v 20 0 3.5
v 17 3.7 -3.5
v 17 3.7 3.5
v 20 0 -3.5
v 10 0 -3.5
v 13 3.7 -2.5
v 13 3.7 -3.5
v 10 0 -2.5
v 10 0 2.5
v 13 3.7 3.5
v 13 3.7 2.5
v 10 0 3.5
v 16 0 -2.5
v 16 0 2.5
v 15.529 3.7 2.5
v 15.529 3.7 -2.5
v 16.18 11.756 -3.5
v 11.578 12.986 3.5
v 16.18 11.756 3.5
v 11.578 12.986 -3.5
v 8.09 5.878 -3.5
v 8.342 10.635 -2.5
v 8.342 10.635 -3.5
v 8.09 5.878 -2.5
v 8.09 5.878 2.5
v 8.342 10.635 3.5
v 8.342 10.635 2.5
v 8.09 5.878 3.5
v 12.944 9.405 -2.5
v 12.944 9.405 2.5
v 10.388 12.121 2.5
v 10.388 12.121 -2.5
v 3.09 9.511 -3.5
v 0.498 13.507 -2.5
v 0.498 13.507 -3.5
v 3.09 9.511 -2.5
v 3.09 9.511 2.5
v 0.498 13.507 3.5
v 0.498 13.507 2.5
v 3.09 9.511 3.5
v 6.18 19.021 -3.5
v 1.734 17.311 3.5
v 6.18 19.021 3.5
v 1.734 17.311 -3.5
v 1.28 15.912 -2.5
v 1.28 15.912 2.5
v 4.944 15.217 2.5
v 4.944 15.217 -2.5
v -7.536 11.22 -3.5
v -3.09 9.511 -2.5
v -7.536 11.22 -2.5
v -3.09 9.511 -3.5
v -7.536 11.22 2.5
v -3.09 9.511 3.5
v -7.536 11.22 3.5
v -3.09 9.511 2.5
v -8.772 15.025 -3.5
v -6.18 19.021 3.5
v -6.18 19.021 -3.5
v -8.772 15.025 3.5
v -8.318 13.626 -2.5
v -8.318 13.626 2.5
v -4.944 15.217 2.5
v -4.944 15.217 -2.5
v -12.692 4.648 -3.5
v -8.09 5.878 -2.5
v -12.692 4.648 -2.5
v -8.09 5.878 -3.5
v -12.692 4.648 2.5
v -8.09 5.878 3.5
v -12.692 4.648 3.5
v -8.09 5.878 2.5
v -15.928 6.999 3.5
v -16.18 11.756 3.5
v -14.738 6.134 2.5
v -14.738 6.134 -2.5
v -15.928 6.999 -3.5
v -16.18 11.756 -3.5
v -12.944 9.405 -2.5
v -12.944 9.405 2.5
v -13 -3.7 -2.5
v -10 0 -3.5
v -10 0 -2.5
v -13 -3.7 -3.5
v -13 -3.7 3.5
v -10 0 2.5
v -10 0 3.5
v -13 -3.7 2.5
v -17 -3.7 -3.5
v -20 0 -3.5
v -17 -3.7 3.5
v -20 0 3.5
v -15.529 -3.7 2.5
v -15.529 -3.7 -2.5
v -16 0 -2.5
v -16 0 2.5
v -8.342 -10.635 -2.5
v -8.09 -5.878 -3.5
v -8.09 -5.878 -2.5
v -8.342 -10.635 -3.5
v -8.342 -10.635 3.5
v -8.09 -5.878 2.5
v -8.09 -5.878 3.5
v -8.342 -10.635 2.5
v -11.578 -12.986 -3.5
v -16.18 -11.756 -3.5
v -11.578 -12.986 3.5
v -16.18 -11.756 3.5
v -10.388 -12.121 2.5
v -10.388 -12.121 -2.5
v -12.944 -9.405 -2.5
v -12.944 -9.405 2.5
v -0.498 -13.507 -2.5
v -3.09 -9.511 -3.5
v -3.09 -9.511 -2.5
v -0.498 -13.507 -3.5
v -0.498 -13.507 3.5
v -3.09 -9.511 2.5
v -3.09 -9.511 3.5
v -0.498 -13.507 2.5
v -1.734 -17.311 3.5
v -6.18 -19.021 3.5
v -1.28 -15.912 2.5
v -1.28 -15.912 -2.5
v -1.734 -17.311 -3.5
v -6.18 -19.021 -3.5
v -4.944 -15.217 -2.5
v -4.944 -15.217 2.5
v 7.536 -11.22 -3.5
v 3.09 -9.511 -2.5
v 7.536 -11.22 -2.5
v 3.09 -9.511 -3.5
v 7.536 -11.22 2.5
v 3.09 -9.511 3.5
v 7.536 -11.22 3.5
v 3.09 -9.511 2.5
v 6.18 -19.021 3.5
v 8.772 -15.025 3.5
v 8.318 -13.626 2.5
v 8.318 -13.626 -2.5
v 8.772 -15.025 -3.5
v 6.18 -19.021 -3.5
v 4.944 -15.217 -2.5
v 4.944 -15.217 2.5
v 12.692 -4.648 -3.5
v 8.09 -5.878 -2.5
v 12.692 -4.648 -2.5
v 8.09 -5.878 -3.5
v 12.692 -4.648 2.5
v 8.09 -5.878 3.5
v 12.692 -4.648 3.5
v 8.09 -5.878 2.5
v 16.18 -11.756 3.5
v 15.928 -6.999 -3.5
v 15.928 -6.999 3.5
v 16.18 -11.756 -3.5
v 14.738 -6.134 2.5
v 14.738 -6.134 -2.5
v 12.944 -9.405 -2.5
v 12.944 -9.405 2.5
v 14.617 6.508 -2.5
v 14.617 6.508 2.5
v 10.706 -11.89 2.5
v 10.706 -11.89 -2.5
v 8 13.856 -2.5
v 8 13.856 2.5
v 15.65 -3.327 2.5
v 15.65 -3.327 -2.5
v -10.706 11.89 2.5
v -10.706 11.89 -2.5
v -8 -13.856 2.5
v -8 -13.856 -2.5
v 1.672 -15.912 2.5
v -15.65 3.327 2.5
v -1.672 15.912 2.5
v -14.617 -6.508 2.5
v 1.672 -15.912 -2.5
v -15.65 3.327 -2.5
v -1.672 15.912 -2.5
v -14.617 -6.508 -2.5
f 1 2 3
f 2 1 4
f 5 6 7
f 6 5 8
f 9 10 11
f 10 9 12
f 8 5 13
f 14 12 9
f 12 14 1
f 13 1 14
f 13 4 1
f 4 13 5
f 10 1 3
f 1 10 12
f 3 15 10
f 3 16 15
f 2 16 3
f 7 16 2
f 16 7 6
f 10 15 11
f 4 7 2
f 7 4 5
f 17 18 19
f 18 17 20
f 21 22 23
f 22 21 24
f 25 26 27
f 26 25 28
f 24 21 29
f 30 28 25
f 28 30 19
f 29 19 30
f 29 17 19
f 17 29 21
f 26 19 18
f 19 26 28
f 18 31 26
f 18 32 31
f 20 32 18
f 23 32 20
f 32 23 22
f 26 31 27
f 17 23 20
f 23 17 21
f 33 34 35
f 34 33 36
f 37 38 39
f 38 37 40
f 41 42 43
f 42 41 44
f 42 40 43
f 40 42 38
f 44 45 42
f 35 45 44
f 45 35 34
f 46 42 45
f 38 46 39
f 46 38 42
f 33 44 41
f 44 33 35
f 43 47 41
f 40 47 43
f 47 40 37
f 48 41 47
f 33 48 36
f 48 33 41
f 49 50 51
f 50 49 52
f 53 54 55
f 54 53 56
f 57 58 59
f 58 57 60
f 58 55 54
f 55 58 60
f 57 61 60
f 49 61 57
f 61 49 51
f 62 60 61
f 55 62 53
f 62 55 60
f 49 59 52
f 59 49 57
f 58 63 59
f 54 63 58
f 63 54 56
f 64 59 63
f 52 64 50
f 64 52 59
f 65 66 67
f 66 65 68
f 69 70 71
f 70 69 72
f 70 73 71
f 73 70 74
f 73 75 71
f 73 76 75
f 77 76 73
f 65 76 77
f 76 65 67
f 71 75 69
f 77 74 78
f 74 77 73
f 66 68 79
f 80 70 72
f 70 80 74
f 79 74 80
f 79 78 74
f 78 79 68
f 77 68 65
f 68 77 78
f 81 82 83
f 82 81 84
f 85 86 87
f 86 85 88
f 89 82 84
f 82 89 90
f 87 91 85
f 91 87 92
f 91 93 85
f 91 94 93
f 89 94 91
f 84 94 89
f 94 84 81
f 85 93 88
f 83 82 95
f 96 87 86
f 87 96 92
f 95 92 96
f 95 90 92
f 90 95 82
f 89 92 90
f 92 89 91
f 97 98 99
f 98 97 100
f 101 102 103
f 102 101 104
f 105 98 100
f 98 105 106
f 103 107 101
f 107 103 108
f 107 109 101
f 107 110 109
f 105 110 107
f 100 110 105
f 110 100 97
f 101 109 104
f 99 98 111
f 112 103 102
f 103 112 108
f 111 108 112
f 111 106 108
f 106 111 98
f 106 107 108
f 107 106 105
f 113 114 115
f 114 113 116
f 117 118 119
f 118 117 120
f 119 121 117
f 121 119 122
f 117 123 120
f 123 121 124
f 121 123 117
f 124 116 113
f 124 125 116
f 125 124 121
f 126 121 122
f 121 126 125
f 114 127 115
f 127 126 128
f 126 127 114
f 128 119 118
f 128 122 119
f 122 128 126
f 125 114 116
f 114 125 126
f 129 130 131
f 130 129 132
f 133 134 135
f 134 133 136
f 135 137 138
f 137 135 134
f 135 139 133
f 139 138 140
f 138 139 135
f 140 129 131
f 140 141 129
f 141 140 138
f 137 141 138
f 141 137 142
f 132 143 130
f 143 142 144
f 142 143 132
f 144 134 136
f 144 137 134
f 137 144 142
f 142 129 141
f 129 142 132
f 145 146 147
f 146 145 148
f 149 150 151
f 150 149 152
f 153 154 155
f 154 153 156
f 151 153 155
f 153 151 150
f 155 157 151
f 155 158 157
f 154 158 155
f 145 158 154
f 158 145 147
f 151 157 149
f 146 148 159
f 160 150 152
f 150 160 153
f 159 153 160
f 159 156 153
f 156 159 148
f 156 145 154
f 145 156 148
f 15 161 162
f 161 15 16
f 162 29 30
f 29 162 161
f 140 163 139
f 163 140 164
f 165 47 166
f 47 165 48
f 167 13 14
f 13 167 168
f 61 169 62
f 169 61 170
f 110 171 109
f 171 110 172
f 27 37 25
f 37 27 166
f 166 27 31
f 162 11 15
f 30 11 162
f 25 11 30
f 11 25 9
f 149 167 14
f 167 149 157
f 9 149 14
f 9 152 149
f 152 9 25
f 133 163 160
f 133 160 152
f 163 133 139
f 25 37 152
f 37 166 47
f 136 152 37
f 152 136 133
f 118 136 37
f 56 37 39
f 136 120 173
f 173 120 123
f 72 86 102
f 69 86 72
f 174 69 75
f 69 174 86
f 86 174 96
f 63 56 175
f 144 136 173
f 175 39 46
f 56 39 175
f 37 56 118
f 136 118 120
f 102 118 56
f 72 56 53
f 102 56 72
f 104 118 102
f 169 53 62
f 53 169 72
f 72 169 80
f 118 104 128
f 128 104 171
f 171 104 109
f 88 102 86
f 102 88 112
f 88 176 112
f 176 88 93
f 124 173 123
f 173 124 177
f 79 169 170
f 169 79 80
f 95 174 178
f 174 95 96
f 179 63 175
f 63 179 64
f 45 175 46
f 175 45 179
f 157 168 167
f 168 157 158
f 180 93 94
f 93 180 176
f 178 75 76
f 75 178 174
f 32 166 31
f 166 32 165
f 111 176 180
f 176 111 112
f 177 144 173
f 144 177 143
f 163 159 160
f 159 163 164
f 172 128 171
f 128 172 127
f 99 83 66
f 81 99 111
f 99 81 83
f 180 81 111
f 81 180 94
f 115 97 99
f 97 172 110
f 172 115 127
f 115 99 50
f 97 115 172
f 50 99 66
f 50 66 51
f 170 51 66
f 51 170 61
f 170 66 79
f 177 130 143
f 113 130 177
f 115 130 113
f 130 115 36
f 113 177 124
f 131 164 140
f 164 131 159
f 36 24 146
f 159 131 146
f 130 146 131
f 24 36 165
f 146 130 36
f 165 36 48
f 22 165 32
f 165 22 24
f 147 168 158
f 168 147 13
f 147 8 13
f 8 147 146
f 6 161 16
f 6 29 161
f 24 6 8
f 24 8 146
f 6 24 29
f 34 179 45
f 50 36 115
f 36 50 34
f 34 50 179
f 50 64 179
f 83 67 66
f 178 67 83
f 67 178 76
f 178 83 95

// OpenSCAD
module Circular_Blade(){

    union(){   
        color("#a8b0b2")
        cylinder(5,16,16,$fn=30,center= true);

        for (i=[0:45:359]) {
            r = 15; // pattern radius
            n = 10; // number of Blade
            step = 360/n;
        for (i=[0:step:359]) {
            angle = i;
            dx = r*cos(angle);
            dy = r*sin(angle);
            translate([dx,dy,0])
            rotate([0,0,angle])
             
            color("#99a3a3")    
            linear_extrude(7, scale = 1, center = true)
            polygon(points=[[0,0],[5,0],[2,3.7],[-2,3.7],[-5,0]]);
             }
        }
    }
}

Circular_Blade();

// Written by Nicolì Angelo (Gengio) 2024: 
// MIT License

//Permission is hereby granted, free of charge, to any person obtaining a copy of this software and associated documentation files (the "Software"), to deal in the Software without restriction, including without limitation the rights to use, copy, modify, merge, publish, distribute, sublicense, and/or sell copies of the Software, and to permit persons to whom the Software is furnished to do so, subject to the following conditions:

//The above copyright notice and this permission notice shall be included in all copies or substantial portions of the Software.

//THE SOFTWARE IS PROVIDED "AS IS", WITHOUT WARRANTY OF ANY KIND, EXPRESS OR IMPLIED, INCLUDING BUT NOT LIMITED TO THE WARRANTIES OF MERCHANTABILITY, FITNESS FOR A PARTICULAR PURPOSE AND NONINFRINGEMENT. IN NO EVENT SHALL THE AUTHORS OR COPYRIGHT HOLDERS BE LIABLE FOR ANY CLAIM, DAMAGES OR OTHER LIABILITY, WHETHER IN AN ACTION OF CONTRACT, TORT OR OTHERWISE, ARISING FROM, OUT OF OR IN CONNECTION WITH THE SOFTWARE OR THE USE OR OTHER DEALINGS IN THE SOFTWARE.
